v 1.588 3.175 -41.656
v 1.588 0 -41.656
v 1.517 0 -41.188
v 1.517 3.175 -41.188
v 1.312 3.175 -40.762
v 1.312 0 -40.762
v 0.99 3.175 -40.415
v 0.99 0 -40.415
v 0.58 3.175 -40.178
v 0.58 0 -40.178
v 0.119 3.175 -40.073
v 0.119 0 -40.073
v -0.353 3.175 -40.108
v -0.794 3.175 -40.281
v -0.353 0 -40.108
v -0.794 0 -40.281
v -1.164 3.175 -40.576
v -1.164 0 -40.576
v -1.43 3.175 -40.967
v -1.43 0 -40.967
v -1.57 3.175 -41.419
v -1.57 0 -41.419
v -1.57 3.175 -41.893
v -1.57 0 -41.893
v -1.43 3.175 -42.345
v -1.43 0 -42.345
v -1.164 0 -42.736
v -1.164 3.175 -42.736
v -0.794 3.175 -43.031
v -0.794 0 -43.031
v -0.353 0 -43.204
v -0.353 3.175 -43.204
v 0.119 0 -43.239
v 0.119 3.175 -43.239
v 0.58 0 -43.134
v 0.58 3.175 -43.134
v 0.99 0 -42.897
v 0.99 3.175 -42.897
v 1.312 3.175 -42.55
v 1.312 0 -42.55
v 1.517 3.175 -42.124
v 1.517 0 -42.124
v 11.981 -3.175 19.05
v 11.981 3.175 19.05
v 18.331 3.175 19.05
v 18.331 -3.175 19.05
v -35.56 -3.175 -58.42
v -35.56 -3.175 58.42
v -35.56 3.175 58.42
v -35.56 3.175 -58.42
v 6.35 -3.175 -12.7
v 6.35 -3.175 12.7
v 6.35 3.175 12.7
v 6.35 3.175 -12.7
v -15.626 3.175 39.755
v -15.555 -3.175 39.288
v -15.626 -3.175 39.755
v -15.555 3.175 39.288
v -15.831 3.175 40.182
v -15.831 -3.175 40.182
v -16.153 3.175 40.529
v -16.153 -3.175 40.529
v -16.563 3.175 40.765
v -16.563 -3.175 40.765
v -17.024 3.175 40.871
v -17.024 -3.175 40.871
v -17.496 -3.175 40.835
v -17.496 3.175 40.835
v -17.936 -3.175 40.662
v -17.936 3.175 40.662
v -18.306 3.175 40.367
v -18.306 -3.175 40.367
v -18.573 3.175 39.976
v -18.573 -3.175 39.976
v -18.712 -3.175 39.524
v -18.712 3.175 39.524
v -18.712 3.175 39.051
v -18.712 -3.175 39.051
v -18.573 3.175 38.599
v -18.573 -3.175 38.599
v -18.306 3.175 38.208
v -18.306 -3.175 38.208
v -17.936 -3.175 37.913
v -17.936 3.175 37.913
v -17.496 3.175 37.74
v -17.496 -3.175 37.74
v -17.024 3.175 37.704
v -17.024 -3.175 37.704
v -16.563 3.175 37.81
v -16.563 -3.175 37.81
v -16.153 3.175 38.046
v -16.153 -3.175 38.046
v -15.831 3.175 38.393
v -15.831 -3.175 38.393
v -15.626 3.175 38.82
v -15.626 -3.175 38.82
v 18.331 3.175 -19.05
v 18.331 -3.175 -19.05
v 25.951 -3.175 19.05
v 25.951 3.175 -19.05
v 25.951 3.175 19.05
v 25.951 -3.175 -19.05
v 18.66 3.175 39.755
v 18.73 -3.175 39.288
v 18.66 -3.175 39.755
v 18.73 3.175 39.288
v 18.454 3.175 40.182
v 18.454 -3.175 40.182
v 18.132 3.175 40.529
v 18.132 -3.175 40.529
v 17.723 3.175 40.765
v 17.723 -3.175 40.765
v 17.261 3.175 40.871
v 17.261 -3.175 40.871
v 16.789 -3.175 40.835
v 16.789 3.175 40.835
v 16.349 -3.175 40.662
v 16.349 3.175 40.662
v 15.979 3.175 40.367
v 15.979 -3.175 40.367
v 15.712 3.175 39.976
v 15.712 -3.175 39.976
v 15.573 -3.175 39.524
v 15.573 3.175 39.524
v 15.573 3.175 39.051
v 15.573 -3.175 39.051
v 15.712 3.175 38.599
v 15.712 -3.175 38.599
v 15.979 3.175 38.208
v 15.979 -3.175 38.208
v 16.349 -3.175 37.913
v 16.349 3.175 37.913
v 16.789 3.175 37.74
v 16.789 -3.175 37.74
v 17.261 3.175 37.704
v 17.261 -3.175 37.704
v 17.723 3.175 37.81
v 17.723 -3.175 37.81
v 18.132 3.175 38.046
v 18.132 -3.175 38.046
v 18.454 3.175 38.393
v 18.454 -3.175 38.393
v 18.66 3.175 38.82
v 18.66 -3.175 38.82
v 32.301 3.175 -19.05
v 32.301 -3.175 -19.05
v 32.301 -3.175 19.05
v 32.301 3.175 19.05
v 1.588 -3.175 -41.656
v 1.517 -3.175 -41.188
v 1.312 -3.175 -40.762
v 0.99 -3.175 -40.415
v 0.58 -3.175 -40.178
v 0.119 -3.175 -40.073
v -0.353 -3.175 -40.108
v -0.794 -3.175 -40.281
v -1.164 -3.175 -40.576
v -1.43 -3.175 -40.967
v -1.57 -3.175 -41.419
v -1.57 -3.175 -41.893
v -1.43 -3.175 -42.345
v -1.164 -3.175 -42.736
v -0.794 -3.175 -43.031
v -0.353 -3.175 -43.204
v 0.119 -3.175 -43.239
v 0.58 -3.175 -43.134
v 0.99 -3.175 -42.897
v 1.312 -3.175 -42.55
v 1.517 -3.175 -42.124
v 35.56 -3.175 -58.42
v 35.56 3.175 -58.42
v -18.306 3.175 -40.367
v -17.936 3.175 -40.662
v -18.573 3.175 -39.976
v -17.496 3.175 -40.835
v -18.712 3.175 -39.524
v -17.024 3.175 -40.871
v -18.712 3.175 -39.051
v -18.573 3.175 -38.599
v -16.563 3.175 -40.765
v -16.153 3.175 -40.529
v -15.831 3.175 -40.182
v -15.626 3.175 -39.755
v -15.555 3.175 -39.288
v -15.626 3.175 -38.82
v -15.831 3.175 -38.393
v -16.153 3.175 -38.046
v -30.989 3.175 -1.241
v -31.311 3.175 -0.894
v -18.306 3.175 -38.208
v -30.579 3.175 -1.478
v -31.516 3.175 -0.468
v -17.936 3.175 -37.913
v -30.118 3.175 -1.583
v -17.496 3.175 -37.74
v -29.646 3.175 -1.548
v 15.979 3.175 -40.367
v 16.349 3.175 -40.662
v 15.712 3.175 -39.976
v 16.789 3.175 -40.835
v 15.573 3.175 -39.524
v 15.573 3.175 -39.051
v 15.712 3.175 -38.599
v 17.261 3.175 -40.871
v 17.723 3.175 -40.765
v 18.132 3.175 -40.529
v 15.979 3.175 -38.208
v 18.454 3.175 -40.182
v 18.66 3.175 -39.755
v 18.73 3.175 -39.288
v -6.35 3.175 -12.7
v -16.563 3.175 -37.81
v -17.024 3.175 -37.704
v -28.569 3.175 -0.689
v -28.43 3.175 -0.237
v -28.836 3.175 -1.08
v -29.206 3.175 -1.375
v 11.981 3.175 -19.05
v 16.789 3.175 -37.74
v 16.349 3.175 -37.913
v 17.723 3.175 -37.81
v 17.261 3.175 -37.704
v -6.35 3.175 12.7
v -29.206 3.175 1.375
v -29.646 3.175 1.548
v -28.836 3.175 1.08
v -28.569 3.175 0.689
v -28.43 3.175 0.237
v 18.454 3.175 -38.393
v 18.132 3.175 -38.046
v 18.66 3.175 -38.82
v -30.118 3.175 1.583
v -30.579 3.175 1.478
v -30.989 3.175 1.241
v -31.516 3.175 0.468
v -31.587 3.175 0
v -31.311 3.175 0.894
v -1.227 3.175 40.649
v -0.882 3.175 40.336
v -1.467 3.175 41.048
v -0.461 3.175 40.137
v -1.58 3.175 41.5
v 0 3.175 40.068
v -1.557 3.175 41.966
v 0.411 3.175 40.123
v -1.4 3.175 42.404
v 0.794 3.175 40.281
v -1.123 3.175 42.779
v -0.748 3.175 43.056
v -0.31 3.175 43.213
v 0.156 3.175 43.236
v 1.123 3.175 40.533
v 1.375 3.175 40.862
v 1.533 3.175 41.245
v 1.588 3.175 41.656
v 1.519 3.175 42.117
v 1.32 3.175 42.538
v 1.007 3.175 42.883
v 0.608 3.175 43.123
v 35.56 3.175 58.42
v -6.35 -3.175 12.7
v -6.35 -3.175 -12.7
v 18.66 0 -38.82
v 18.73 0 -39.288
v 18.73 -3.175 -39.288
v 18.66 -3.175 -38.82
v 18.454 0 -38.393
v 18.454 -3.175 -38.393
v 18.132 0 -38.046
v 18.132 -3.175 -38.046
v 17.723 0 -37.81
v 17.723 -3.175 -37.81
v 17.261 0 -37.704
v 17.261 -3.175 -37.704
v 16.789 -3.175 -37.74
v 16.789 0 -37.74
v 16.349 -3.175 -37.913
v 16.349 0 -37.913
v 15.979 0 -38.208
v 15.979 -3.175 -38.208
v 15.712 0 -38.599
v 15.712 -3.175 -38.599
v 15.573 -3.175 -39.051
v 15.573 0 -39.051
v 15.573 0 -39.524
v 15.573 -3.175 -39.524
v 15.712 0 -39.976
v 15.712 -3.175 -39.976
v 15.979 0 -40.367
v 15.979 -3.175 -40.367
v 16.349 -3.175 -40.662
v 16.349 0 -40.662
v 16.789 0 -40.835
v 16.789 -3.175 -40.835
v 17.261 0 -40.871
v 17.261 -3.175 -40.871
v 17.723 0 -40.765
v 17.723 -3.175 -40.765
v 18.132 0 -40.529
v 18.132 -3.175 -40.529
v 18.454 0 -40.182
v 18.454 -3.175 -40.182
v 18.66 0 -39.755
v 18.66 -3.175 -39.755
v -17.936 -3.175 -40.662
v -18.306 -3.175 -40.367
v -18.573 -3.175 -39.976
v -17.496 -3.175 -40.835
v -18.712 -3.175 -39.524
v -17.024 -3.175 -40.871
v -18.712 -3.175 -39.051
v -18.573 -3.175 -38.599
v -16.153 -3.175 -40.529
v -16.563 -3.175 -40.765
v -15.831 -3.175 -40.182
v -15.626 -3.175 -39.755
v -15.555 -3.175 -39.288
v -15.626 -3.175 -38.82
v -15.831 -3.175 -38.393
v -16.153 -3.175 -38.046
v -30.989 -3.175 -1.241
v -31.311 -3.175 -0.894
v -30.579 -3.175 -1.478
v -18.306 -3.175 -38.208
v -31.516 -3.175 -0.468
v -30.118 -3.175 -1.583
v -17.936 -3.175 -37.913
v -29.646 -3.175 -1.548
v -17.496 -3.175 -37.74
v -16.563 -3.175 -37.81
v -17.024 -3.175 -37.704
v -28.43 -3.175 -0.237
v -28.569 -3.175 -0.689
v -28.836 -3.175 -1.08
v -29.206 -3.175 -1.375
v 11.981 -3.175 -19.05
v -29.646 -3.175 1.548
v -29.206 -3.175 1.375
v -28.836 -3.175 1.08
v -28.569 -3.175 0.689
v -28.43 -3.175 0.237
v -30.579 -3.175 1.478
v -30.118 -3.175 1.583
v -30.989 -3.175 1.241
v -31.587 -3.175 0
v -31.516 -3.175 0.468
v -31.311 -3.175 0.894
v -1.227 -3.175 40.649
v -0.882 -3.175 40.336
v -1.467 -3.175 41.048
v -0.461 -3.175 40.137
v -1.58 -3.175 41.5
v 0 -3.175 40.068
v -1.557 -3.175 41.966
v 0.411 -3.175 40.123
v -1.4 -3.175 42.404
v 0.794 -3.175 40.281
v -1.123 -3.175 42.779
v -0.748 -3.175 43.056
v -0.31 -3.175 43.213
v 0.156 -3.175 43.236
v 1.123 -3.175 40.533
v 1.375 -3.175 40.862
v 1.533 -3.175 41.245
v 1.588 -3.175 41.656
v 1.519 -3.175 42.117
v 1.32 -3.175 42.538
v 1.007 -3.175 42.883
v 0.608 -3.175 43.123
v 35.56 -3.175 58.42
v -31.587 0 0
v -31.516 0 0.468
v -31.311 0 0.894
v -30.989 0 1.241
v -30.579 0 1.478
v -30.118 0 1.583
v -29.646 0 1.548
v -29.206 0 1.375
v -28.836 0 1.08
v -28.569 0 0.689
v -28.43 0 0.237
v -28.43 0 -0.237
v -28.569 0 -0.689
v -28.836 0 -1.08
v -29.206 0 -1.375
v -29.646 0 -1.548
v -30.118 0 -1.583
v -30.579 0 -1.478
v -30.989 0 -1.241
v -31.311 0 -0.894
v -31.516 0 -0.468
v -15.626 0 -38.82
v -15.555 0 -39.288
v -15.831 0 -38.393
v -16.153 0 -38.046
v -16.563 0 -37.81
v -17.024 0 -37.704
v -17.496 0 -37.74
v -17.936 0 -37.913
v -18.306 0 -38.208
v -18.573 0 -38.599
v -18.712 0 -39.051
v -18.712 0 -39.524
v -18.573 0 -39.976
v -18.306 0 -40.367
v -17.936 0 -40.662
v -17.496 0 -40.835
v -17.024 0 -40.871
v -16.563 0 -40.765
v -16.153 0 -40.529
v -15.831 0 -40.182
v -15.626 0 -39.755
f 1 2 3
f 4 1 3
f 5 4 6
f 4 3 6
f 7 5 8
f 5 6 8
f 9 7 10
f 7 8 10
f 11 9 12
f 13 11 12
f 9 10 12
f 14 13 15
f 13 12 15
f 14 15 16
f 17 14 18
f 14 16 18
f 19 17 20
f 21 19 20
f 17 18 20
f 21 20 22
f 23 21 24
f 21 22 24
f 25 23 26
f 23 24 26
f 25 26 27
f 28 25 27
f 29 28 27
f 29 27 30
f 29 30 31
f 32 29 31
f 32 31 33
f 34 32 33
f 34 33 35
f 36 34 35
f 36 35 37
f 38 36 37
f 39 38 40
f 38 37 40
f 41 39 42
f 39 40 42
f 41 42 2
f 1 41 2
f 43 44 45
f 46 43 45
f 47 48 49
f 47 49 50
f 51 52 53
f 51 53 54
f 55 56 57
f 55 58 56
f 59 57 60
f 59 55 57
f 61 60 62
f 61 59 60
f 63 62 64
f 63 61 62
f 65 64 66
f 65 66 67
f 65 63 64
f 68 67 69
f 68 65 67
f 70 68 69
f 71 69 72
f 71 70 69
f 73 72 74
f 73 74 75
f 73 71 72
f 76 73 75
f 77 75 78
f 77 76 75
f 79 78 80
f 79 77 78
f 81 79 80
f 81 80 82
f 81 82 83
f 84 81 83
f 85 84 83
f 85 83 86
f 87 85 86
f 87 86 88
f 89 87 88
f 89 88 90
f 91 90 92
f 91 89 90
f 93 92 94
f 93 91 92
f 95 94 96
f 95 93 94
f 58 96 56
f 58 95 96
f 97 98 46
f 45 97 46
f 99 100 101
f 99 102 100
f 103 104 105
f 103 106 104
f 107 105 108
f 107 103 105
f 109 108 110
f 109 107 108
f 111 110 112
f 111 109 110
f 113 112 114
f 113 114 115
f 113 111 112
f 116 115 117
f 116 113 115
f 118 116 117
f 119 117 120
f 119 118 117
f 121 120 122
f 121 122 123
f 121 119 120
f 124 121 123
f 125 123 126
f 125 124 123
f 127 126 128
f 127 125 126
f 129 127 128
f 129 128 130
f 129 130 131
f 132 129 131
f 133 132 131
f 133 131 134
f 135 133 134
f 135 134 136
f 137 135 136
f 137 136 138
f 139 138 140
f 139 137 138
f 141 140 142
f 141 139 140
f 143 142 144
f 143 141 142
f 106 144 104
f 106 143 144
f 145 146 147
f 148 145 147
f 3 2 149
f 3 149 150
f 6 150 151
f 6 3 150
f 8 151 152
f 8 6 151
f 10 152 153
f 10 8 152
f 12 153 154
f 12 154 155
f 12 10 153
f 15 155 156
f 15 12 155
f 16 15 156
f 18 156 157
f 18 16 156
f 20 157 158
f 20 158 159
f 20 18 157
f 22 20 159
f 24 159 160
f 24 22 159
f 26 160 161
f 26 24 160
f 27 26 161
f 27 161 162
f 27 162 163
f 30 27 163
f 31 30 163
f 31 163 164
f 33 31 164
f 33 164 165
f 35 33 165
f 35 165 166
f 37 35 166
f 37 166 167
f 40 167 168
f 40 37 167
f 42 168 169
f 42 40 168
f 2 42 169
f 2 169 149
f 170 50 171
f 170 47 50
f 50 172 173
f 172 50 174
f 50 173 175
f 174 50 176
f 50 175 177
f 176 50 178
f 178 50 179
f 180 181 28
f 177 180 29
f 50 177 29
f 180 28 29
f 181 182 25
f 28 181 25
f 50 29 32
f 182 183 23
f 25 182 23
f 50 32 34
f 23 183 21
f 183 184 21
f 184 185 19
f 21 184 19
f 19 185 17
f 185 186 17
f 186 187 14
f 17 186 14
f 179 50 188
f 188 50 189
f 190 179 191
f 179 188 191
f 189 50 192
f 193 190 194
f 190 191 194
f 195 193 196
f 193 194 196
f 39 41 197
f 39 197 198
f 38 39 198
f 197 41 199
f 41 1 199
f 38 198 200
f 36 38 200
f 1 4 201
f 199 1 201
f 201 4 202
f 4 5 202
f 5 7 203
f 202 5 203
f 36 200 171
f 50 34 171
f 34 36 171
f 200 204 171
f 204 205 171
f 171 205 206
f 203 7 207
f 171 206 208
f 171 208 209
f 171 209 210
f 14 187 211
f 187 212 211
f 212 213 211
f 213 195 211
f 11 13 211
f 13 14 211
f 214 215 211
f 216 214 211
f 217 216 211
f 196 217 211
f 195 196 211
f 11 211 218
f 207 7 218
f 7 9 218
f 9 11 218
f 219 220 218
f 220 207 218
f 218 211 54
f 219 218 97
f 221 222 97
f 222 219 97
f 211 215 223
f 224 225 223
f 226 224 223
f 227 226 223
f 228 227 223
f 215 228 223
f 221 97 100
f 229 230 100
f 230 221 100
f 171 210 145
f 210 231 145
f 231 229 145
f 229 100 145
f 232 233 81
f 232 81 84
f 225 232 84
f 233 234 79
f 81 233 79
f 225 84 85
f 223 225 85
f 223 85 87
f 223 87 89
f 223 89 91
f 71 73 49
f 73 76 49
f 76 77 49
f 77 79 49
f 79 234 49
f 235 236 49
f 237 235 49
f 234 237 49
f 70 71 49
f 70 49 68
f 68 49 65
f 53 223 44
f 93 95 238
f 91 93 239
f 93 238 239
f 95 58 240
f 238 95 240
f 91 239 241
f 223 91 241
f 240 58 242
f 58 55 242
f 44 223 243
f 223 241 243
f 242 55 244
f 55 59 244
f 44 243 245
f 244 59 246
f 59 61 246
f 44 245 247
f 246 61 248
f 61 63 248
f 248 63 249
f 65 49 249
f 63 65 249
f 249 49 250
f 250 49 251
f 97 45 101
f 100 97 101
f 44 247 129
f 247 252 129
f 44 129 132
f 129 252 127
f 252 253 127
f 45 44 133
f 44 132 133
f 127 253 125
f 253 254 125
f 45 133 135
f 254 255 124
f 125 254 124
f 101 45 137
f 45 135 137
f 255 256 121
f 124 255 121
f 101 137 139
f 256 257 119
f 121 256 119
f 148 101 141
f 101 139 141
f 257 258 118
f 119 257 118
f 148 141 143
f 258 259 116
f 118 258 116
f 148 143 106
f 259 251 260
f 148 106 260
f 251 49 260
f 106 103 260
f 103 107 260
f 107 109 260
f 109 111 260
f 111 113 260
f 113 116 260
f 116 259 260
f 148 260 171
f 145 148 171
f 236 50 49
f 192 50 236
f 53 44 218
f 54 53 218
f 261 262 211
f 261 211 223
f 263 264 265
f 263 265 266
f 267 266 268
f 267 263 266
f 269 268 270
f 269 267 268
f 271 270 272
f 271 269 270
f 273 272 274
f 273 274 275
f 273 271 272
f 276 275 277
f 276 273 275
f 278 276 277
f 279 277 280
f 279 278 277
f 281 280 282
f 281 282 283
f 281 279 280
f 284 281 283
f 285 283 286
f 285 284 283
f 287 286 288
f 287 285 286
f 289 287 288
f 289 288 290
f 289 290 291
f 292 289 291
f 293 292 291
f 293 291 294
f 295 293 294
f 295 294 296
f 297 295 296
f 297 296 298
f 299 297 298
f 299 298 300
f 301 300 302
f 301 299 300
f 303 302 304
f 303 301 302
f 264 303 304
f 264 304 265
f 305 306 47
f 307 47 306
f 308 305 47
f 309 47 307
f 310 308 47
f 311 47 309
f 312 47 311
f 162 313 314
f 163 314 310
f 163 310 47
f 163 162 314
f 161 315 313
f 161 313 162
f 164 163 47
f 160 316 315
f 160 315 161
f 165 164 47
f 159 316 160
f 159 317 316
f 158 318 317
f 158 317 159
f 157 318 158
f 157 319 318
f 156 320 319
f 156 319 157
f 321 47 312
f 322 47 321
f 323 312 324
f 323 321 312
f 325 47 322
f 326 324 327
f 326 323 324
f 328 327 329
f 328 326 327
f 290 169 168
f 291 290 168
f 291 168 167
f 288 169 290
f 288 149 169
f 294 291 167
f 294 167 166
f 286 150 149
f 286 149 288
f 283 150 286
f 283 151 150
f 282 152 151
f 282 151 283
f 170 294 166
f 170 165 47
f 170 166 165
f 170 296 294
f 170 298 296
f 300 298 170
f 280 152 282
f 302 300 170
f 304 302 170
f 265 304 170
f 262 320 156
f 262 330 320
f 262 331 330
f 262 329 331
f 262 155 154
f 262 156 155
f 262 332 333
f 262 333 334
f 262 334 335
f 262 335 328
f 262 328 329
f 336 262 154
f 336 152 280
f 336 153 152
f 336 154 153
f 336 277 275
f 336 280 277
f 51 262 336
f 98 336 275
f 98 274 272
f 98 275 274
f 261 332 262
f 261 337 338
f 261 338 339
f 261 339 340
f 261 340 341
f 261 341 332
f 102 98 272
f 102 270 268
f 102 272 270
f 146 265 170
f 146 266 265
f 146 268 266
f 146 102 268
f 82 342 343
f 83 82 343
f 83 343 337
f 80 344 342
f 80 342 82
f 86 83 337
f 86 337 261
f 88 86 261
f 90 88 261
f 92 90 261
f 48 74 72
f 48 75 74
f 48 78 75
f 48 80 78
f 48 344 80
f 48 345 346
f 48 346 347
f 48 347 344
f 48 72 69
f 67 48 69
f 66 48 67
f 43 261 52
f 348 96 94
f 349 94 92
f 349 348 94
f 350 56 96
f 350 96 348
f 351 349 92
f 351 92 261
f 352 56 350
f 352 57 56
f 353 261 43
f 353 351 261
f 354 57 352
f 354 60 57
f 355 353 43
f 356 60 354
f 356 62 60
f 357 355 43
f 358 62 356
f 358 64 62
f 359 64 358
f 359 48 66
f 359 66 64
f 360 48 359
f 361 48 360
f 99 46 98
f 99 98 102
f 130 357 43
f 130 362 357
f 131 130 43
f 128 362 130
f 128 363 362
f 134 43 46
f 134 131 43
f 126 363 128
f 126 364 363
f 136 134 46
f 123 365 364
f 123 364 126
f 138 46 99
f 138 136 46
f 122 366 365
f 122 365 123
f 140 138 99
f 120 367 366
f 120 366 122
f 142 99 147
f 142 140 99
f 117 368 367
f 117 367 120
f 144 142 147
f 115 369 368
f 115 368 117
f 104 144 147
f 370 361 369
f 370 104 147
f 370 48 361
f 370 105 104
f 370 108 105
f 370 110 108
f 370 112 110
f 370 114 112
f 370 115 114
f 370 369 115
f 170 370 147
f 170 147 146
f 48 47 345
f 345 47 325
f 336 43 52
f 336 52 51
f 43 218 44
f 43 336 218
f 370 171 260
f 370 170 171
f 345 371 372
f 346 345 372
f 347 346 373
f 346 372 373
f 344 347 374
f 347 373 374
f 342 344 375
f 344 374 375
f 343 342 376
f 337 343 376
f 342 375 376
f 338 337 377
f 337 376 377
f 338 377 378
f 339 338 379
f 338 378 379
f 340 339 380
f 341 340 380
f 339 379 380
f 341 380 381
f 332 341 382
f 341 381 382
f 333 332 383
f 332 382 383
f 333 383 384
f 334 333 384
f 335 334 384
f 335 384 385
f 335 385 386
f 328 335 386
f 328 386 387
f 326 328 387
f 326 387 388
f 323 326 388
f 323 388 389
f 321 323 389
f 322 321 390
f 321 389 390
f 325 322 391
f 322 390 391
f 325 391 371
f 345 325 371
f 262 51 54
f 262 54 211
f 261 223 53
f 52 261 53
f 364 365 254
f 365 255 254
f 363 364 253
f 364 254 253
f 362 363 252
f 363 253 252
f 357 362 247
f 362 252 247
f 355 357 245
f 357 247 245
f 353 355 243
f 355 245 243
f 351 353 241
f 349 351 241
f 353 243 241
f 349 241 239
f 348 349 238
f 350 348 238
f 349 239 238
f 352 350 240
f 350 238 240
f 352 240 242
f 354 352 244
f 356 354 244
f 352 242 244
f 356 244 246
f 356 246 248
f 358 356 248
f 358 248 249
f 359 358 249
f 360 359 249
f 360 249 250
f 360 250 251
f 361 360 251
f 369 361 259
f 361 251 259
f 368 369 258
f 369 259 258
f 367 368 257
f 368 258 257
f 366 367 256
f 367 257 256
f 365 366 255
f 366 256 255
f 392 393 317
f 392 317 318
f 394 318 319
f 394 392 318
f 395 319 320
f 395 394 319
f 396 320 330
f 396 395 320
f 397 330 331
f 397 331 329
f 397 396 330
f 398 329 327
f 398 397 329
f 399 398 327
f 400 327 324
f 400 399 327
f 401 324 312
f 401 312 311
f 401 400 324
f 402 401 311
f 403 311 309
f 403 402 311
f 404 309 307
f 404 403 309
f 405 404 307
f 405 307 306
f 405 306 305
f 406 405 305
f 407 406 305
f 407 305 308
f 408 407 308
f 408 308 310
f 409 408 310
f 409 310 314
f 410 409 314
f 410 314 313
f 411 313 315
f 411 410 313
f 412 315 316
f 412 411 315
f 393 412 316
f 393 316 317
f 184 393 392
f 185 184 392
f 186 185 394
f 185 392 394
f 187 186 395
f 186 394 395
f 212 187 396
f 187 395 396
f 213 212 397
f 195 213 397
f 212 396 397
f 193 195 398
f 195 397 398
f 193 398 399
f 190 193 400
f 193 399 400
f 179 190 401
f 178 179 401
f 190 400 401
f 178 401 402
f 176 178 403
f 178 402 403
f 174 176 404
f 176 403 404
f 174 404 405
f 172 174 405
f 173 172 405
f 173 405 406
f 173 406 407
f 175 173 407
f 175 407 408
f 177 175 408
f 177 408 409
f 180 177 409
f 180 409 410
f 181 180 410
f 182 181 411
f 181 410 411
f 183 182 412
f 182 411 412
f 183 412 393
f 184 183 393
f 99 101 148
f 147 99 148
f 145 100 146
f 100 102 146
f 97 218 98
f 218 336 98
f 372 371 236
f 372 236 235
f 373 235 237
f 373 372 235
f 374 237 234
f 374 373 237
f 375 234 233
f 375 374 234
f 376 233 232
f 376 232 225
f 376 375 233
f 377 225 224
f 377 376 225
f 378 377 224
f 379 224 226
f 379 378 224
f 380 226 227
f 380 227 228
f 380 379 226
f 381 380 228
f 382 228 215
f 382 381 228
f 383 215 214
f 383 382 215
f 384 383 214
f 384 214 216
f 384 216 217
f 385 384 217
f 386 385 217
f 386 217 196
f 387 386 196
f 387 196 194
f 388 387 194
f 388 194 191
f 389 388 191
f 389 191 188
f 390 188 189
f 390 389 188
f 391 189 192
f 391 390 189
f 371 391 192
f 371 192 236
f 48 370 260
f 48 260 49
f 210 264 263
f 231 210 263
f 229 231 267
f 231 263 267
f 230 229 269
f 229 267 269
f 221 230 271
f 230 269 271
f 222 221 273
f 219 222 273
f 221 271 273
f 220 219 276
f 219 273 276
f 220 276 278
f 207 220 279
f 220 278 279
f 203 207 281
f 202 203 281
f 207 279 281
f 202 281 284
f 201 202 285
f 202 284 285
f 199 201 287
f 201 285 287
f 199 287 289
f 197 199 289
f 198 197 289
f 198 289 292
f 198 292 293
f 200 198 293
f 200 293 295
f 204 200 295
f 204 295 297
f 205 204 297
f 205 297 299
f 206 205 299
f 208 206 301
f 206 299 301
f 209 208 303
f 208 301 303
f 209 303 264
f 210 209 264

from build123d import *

# Parameters (mm, degrees)
F0_R     = 1.5875
F0_W     = 6.35
F0_H     = 38.1
F1_DEPTH = 3.175
F2_DEPTH = 2.54


# Not quite as in the source:
# - a feature names something its author has since deleted; it is built from what else it names


with BuildPart() as f1:
    # F0 (on Front) → F1 (new body, symmetric)
    with BuildSketch(Plane.XZ):
        Polygon((35.56, -58.42), (35.56, 58.42), (-35.56, 58.42), (-35.56, 0), (-35.56, -58.42), align=None)
        with Locations((-17.1425342897, -39.2875)):
            Circle(F0_R, mode=Mode.SUBTRACT)
        with Locations((0, -41.656)):
            Circle(F0_R, mode=Mode.SUBTRACT)
        with BuildLine():
            ThreePointArc((-28.4118865192, 0), (-29.9993865192, -1.5875), (-31.5868865192, 0))
            ThreePointArc((-31.5868865192, 0), (-29.9993865192, 1.5875), (-28.4118865192, 0))
        make_face(mode=Mode.SUBTRACT)
        Polygon((-6.35, -12.7), (-6.35, 12.7), (0, 12.7), (6.35, 12.7), (6.35, -12.7), align=None, mode=Mode.SUBTRACT)
        with Locations((17.1425342897, -39.2875)):
            Circle(F0_R, mode=Mode.SUBTRACT)
        with Locations((15.1556345809, 0)):
            Rectangle(F0_W, F0_H, mode=Mode.SUBTRACT)
        with Locations((29.1256345809, 0)):
            Rectangle(F0_W, F0_H, mode=Mode.SUBTRACT)
        with Locations((-17.1425342897, 39.2875)):
            Circle(F0_R, mode=Mode.SUBTRACT)
        with BuildLine():
            ThreePointArc((1.5875, 41.656), (1.1225320151, 40.5334679849), (0, 40.0685))
            ThreePointArc((0, 40.0685), (-1.1225320151, 42.7785320151), (1.5875, 41.656))
        make_face(mode=Mode.SUBTRACT)
        with Locations((17.1425342897, 39.2875)):
            Circle(F0_R, mode=Mode.SUBTRACT)
    extrude(amount=F1_DEPTH, both=True)

    # F0 (on Front) → F2 (cut)
    with BuildSketch(Plane.XZ):
        with Locations((15.1556345809, 0)):
            Rectangle(F0_W, F0_H)
        with Locations((29.1256345809, 0)):
            Rectangle(F0_W, F0_H)
    extrude(amount=-F2_DEPTH, mode=Mode.SUBTRACT)


solid = f1.part
